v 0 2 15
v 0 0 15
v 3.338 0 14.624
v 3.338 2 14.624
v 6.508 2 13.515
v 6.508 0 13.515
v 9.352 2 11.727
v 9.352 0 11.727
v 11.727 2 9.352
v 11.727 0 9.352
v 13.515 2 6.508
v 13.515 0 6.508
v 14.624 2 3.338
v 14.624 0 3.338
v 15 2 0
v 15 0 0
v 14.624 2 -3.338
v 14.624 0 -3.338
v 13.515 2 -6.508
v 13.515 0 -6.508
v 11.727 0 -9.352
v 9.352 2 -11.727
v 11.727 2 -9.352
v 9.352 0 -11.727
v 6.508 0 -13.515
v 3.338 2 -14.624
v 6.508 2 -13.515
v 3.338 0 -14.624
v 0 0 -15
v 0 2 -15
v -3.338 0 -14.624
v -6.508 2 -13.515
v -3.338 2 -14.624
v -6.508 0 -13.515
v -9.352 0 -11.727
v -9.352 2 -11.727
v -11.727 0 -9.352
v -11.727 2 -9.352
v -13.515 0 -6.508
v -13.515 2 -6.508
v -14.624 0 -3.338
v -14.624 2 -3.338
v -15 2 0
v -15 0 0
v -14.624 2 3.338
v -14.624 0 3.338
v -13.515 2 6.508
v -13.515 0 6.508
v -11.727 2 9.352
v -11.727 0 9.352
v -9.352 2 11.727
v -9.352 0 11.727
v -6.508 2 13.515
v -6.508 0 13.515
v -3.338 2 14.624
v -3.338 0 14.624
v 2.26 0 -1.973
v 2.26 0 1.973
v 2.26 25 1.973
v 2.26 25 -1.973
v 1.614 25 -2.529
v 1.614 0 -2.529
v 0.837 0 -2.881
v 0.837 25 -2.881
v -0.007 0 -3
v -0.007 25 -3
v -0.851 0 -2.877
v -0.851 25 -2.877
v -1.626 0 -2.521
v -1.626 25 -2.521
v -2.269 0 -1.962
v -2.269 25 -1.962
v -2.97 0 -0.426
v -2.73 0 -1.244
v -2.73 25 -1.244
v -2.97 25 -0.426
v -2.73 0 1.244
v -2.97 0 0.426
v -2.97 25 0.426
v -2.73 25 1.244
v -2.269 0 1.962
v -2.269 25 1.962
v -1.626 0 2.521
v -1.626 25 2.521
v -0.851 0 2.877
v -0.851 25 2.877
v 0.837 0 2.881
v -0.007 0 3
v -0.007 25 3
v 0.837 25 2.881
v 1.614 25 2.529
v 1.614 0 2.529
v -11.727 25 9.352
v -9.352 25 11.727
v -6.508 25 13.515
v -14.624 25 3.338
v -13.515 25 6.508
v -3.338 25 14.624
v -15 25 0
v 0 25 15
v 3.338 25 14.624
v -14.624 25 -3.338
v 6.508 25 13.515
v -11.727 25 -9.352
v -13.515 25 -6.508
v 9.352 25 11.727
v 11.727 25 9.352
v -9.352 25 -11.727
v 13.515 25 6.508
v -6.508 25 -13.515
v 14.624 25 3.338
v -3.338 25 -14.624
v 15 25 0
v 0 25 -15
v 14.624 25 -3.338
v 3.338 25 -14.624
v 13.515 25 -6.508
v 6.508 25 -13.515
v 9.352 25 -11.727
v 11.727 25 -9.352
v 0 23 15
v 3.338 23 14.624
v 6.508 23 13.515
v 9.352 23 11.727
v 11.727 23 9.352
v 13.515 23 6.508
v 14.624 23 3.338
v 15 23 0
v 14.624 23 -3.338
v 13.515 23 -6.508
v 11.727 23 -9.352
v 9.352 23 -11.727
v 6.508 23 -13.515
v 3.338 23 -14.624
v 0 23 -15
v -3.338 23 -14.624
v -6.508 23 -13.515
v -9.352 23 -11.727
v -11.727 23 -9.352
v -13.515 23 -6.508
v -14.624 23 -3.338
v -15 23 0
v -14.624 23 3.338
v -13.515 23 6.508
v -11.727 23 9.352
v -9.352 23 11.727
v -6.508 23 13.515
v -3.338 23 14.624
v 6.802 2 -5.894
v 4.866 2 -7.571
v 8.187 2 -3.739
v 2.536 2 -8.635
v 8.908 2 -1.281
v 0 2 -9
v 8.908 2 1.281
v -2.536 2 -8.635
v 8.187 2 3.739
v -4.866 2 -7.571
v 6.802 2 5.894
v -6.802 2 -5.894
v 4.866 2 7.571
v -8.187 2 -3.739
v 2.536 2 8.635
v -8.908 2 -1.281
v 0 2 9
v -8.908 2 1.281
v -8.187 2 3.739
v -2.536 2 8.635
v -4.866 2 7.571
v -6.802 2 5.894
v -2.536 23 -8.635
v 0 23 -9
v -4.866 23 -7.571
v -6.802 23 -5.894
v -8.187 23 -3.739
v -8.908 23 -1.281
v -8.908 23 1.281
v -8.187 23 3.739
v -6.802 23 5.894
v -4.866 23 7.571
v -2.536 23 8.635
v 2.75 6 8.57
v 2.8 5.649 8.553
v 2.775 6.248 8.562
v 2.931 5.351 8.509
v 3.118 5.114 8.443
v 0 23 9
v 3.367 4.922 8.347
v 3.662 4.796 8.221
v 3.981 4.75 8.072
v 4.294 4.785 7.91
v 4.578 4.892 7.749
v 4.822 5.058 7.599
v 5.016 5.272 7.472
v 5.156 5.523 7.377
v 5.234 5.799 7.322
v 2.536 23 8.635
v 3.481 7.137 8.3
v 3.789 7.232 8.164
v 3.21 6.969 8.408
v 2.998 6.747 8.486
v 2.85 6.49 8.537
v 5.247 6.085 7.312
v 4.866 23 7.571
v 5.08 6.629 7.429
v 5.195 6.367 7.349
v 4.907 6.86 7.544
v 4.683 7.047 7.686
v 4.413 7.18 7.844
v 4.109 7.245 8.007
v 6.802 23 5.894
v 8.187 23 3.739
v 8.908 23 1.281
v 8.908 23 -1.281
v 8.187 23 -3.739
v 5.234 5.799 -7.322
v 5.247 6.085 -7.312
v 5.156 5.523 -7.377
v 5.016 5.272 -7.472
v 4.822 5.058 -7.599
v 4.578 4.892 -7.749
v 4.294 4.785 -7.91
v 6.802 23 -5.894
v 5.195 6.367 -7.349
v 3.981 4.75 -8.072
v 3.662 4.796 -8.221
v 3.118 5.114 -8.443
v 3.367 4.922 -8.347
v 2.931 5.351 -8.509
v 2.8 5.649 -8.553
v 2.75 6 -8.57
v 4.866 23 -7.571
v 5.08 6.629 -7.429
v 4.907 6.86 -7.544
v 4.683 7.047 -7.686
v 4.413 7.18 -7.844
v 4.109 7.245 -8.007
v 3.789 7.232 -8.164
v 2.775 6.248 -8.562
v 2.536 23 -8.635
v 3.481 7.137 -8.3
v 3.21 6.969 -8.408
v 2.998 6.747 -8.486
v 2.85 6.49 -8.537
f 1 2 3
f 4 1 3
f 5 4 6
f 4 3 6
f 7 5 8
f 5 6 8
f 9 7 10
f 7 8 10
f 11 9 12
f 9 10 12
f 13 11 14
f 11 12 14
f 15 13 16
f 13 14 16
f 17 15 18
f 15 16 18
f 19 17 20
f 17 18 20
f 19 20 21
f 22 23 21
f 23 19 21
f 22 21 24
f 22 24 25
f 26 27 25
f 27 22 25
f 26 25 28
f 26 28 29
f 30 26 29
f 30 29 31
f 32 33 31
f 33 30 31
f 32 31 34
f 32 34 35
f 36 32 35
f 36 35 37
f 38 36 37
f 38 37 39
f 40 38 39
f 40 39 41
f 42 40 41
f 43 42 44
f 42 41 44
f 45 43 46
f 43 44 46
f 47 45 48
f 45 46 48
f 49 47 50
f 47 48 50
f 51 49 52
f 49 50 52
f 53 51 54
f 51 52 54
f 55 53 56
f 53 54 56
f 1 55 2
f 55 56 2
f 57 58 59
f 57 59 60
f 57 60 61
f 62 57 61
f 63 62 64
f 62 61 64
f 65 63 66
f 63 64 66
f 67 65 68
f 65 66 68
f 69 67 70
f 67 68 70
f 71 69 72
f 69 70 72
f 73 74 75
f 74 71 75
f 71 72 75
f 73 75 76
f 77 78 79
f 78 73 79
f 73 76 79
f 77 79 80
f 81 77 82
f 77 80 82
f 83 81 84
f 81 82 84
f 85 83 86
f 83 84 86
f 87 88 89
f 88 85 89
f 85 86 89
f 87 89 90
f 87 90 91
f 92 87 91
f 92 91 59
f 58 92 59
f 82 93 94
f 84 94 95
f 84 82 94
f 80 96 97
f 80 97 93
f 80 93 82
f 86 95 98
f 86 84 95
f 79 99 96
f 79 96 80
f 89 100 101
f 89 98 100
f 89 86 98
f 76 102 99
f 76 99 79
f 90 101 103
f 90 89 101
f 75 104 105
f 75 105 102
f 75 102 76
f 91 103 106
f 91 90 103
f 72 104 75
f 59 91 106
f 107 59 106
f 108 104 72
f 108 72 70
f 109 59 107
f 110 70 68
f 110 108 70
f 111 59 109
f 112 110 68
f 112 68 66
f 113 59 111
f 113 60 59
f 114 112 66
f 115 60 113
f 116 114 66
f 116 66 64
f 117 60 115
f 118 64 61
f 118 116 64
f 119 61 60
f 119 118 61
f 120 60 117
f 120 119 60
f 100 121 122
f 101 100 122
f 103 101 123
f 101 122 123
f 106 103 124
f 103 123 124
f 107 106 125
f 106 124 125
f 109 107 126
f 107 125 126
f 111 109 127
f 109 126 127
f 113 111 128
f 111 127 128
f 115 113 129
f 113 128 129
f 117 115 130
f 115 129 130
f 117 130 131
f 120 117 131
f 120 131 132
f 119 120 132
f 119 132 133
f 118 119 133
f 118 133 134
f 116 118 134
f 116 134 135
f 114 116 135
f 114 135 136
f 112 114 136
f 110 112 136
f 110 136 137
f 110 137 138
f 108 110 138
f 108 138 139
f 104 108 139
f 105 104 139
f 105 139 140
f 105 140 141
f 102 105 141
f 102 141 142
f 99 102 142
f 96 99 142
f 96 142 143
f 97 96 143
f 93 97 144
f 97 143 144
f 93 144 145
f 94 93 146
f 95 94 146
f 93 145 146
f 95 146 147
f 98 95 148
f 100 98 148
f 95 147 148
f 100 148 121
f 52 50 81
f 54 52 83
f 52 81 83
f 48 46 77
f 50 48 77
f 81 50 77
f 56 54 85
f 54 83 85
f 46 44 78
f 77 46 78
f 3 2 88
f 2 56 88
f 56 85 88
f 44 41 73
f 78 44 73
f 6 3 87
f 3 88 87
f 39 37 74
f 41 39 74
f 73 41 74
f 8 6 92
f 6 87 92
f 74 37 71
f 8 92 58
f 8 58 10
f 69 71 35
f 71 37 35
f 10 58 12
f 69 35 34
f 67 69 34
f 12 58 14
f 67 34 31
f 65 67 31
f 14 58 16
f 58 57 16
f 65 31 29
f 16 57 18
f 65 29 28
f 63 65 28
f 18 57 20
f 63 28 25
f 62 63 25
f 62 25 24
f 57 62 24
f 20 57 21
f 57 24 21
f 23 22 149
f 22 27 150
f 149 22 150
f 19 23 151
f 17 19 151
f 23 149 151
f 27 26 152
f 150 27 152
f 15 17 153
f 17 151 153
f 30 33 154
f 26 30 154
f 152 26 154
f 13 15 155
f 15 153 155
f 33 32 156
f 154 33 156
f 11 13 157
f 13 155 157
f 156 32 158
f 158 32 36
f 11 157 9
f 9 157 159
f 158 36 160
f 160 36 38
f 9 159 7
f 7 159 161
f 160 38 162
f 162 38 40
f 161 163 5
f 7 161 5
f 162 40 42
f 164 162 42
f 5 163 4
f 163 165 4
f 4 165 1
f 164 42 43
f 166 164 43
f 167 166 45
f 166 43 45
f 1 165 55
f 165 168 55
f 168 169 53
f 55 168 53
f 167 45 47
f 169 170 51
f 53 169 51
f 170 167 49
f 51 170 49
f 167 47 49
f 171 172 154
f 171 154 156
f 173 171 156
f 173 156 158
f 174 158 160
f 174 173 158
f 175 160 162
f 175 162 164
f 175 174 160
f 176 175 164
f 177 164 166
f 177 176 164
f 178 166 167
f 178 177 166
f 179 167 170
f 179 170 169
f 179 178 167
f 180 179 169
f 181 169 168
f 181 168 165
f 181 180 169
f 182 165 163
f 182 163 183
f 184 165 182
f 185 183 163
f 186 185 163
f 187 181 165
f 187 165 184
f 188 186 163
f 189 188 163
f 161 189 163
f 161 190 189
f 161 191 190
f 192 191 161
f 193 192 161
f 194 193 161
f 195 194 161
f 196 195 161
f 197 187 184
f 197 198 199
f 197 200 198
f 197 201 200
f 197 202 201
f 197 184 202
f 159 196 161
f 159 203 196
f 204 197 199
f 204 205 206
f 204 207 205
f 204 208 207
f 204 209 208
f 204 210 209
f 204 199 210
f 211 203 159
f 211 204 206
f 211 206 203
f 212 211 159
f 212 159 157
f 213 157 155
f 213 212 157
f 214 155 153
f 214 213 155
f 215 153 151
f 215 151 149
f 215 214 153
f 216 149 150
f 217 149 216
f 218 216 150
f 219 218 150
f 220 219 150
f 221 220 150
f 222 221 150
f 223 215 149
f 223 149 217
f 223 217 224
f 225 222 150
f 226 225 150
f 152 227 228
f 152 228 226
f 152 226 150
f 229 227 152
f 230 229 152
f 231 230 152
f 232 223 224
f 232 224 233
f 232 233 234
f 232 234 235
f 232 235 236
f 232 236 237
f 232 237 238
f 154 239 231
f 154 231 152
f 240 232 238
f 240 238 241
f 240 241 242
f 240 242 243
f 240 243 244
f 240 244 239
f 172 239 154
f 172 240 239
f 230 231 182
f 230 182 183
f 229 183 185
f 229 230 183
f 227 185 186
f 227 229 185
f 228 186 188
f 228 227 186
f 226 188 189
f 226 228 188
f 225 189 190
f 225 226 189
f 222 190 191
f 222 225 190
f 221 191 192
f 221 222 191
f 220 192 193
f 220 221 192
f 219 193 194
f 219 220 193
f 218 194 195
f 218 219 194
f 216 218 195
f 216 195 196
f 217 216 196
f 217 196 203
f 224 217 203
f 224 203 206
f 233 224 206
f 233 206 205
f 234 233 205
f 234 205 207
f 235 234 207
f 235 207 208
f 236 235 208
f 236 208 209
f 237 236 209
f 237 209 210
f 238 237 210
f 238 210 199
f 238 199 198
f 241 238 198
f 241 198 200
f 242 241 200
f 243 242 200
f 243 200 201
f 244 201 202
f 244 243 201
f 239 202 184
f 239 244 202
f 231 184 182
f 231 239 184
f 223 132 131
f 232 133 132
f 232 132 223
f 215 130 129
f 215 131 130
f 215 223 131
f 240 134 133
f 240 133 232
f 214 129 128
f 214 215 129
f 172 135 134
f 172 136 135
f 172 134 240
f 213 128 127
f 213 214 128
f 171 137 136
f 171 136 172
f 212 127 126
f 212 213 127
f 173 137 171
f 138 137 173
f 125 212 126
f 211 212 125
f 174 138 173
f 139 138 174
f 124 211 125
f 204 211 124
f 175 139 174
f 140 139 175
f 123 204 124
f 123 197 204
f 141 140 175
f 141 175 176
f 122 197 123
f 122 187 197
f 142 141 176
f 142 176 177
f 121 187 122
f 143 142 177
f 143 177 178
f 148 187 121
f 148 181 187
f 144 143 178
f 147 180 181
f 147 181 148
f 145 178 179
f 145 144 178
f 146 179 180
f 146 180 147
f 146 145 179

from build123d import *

# Parameters (mm, degrees)
SKETCH1_R               = 15
BOSS_EXTRUDE1_DEPTH     = 25
SKETCH2_R               = 3
CUT_EXTRUDE1_DEPTH      = 25
SKETCH3_W               = 0.8
SKETCH3_H               = 3.945833246
BOSS_EXTRUDE2_DEPTH     = 25
CUT_EXTRUDE2_DEPTH      = 2000
CUT_EXTRUDE2_DEPTH_BACK = 25
SKETCH4_R               = 1.25
SKETCH5_W               = 6
SKETCH5_H               = 21


with BuildPart() as part:
    # Sketch1 → Boss-Extrude1 (new body)
    with BuildSketch(Plane(origin=(0, 0, 0), x_dir=(1, 0, 0), z_dir=(0, 1, 0))):
        with Locations(Location((0, 0, 0), (0, 0, 270))):
            Circle(SKETCH1_R)
    extrude(amount=BOSS_EXTRUDE1_DEPTH)

    # Sketch2 → Cut-Extrude1 (cut)
    with BuildSketch(Plane(origin=(0, 25, 0), x_dir=(1, 0, 0), z_dir=(0, 1, 0))):
        with Locations(Location((0, 0, 0), (0, 0, 270))):
            Circle(SKETCH2_R)
    extrude(amount=-CUT_EXTRUDE1_DEPTH, mode=Mode.SUBTRACT)

    # Sketch3 → Boss-Extrude2 (add)
    with BuildSketch(Plane(origin=(0, 0, 0), x_dir=(1, 0, 0), z_dir=(0, 1, 0))):
        with Locations((2.66, 0)):
            Rectangle(SKETCH3_W, SKETCH3_H)
    extrude(amount=BOSS_EXTRUDE2_DEPTH)

    # Sketch4 → Cut-Extrude2 (cut, two sides: drawn at the far end of the back side and taken through both)
    with BuildSketch(Plane.XY.offset(-CUT_EXTRUDE2_DEPTH_BACK)):
        with Locations(Location((4, 6, 0), (0, 0, 180))):
            Circle(SKETCH4_R)
    extrude(amount=CUT_EXTRUDE2_DEPTH + CUT_EXTRUDE2_DEPTH_BACK, mode=Mode.SUBTRACT)

    # Sketch5 → Cut-Revolve1 (revolve, cut)
    with BuildSketch(Plane.XY, mode=Mode.PRIVATE) as cut_revolve1_sk:
        with Locations((12, 12.5)):
            Rectangle(SKETCH5_W, SKETCH5_H)
    revolve(cut_revolve1_sk.sketch.rotate(Axis((0, 0, 0), (0, 1, 0)), 90), axis=Axis((0, 0, 0), (0, 1, 0)), mode=Mode.SUBTRACT)


solid = part.part
